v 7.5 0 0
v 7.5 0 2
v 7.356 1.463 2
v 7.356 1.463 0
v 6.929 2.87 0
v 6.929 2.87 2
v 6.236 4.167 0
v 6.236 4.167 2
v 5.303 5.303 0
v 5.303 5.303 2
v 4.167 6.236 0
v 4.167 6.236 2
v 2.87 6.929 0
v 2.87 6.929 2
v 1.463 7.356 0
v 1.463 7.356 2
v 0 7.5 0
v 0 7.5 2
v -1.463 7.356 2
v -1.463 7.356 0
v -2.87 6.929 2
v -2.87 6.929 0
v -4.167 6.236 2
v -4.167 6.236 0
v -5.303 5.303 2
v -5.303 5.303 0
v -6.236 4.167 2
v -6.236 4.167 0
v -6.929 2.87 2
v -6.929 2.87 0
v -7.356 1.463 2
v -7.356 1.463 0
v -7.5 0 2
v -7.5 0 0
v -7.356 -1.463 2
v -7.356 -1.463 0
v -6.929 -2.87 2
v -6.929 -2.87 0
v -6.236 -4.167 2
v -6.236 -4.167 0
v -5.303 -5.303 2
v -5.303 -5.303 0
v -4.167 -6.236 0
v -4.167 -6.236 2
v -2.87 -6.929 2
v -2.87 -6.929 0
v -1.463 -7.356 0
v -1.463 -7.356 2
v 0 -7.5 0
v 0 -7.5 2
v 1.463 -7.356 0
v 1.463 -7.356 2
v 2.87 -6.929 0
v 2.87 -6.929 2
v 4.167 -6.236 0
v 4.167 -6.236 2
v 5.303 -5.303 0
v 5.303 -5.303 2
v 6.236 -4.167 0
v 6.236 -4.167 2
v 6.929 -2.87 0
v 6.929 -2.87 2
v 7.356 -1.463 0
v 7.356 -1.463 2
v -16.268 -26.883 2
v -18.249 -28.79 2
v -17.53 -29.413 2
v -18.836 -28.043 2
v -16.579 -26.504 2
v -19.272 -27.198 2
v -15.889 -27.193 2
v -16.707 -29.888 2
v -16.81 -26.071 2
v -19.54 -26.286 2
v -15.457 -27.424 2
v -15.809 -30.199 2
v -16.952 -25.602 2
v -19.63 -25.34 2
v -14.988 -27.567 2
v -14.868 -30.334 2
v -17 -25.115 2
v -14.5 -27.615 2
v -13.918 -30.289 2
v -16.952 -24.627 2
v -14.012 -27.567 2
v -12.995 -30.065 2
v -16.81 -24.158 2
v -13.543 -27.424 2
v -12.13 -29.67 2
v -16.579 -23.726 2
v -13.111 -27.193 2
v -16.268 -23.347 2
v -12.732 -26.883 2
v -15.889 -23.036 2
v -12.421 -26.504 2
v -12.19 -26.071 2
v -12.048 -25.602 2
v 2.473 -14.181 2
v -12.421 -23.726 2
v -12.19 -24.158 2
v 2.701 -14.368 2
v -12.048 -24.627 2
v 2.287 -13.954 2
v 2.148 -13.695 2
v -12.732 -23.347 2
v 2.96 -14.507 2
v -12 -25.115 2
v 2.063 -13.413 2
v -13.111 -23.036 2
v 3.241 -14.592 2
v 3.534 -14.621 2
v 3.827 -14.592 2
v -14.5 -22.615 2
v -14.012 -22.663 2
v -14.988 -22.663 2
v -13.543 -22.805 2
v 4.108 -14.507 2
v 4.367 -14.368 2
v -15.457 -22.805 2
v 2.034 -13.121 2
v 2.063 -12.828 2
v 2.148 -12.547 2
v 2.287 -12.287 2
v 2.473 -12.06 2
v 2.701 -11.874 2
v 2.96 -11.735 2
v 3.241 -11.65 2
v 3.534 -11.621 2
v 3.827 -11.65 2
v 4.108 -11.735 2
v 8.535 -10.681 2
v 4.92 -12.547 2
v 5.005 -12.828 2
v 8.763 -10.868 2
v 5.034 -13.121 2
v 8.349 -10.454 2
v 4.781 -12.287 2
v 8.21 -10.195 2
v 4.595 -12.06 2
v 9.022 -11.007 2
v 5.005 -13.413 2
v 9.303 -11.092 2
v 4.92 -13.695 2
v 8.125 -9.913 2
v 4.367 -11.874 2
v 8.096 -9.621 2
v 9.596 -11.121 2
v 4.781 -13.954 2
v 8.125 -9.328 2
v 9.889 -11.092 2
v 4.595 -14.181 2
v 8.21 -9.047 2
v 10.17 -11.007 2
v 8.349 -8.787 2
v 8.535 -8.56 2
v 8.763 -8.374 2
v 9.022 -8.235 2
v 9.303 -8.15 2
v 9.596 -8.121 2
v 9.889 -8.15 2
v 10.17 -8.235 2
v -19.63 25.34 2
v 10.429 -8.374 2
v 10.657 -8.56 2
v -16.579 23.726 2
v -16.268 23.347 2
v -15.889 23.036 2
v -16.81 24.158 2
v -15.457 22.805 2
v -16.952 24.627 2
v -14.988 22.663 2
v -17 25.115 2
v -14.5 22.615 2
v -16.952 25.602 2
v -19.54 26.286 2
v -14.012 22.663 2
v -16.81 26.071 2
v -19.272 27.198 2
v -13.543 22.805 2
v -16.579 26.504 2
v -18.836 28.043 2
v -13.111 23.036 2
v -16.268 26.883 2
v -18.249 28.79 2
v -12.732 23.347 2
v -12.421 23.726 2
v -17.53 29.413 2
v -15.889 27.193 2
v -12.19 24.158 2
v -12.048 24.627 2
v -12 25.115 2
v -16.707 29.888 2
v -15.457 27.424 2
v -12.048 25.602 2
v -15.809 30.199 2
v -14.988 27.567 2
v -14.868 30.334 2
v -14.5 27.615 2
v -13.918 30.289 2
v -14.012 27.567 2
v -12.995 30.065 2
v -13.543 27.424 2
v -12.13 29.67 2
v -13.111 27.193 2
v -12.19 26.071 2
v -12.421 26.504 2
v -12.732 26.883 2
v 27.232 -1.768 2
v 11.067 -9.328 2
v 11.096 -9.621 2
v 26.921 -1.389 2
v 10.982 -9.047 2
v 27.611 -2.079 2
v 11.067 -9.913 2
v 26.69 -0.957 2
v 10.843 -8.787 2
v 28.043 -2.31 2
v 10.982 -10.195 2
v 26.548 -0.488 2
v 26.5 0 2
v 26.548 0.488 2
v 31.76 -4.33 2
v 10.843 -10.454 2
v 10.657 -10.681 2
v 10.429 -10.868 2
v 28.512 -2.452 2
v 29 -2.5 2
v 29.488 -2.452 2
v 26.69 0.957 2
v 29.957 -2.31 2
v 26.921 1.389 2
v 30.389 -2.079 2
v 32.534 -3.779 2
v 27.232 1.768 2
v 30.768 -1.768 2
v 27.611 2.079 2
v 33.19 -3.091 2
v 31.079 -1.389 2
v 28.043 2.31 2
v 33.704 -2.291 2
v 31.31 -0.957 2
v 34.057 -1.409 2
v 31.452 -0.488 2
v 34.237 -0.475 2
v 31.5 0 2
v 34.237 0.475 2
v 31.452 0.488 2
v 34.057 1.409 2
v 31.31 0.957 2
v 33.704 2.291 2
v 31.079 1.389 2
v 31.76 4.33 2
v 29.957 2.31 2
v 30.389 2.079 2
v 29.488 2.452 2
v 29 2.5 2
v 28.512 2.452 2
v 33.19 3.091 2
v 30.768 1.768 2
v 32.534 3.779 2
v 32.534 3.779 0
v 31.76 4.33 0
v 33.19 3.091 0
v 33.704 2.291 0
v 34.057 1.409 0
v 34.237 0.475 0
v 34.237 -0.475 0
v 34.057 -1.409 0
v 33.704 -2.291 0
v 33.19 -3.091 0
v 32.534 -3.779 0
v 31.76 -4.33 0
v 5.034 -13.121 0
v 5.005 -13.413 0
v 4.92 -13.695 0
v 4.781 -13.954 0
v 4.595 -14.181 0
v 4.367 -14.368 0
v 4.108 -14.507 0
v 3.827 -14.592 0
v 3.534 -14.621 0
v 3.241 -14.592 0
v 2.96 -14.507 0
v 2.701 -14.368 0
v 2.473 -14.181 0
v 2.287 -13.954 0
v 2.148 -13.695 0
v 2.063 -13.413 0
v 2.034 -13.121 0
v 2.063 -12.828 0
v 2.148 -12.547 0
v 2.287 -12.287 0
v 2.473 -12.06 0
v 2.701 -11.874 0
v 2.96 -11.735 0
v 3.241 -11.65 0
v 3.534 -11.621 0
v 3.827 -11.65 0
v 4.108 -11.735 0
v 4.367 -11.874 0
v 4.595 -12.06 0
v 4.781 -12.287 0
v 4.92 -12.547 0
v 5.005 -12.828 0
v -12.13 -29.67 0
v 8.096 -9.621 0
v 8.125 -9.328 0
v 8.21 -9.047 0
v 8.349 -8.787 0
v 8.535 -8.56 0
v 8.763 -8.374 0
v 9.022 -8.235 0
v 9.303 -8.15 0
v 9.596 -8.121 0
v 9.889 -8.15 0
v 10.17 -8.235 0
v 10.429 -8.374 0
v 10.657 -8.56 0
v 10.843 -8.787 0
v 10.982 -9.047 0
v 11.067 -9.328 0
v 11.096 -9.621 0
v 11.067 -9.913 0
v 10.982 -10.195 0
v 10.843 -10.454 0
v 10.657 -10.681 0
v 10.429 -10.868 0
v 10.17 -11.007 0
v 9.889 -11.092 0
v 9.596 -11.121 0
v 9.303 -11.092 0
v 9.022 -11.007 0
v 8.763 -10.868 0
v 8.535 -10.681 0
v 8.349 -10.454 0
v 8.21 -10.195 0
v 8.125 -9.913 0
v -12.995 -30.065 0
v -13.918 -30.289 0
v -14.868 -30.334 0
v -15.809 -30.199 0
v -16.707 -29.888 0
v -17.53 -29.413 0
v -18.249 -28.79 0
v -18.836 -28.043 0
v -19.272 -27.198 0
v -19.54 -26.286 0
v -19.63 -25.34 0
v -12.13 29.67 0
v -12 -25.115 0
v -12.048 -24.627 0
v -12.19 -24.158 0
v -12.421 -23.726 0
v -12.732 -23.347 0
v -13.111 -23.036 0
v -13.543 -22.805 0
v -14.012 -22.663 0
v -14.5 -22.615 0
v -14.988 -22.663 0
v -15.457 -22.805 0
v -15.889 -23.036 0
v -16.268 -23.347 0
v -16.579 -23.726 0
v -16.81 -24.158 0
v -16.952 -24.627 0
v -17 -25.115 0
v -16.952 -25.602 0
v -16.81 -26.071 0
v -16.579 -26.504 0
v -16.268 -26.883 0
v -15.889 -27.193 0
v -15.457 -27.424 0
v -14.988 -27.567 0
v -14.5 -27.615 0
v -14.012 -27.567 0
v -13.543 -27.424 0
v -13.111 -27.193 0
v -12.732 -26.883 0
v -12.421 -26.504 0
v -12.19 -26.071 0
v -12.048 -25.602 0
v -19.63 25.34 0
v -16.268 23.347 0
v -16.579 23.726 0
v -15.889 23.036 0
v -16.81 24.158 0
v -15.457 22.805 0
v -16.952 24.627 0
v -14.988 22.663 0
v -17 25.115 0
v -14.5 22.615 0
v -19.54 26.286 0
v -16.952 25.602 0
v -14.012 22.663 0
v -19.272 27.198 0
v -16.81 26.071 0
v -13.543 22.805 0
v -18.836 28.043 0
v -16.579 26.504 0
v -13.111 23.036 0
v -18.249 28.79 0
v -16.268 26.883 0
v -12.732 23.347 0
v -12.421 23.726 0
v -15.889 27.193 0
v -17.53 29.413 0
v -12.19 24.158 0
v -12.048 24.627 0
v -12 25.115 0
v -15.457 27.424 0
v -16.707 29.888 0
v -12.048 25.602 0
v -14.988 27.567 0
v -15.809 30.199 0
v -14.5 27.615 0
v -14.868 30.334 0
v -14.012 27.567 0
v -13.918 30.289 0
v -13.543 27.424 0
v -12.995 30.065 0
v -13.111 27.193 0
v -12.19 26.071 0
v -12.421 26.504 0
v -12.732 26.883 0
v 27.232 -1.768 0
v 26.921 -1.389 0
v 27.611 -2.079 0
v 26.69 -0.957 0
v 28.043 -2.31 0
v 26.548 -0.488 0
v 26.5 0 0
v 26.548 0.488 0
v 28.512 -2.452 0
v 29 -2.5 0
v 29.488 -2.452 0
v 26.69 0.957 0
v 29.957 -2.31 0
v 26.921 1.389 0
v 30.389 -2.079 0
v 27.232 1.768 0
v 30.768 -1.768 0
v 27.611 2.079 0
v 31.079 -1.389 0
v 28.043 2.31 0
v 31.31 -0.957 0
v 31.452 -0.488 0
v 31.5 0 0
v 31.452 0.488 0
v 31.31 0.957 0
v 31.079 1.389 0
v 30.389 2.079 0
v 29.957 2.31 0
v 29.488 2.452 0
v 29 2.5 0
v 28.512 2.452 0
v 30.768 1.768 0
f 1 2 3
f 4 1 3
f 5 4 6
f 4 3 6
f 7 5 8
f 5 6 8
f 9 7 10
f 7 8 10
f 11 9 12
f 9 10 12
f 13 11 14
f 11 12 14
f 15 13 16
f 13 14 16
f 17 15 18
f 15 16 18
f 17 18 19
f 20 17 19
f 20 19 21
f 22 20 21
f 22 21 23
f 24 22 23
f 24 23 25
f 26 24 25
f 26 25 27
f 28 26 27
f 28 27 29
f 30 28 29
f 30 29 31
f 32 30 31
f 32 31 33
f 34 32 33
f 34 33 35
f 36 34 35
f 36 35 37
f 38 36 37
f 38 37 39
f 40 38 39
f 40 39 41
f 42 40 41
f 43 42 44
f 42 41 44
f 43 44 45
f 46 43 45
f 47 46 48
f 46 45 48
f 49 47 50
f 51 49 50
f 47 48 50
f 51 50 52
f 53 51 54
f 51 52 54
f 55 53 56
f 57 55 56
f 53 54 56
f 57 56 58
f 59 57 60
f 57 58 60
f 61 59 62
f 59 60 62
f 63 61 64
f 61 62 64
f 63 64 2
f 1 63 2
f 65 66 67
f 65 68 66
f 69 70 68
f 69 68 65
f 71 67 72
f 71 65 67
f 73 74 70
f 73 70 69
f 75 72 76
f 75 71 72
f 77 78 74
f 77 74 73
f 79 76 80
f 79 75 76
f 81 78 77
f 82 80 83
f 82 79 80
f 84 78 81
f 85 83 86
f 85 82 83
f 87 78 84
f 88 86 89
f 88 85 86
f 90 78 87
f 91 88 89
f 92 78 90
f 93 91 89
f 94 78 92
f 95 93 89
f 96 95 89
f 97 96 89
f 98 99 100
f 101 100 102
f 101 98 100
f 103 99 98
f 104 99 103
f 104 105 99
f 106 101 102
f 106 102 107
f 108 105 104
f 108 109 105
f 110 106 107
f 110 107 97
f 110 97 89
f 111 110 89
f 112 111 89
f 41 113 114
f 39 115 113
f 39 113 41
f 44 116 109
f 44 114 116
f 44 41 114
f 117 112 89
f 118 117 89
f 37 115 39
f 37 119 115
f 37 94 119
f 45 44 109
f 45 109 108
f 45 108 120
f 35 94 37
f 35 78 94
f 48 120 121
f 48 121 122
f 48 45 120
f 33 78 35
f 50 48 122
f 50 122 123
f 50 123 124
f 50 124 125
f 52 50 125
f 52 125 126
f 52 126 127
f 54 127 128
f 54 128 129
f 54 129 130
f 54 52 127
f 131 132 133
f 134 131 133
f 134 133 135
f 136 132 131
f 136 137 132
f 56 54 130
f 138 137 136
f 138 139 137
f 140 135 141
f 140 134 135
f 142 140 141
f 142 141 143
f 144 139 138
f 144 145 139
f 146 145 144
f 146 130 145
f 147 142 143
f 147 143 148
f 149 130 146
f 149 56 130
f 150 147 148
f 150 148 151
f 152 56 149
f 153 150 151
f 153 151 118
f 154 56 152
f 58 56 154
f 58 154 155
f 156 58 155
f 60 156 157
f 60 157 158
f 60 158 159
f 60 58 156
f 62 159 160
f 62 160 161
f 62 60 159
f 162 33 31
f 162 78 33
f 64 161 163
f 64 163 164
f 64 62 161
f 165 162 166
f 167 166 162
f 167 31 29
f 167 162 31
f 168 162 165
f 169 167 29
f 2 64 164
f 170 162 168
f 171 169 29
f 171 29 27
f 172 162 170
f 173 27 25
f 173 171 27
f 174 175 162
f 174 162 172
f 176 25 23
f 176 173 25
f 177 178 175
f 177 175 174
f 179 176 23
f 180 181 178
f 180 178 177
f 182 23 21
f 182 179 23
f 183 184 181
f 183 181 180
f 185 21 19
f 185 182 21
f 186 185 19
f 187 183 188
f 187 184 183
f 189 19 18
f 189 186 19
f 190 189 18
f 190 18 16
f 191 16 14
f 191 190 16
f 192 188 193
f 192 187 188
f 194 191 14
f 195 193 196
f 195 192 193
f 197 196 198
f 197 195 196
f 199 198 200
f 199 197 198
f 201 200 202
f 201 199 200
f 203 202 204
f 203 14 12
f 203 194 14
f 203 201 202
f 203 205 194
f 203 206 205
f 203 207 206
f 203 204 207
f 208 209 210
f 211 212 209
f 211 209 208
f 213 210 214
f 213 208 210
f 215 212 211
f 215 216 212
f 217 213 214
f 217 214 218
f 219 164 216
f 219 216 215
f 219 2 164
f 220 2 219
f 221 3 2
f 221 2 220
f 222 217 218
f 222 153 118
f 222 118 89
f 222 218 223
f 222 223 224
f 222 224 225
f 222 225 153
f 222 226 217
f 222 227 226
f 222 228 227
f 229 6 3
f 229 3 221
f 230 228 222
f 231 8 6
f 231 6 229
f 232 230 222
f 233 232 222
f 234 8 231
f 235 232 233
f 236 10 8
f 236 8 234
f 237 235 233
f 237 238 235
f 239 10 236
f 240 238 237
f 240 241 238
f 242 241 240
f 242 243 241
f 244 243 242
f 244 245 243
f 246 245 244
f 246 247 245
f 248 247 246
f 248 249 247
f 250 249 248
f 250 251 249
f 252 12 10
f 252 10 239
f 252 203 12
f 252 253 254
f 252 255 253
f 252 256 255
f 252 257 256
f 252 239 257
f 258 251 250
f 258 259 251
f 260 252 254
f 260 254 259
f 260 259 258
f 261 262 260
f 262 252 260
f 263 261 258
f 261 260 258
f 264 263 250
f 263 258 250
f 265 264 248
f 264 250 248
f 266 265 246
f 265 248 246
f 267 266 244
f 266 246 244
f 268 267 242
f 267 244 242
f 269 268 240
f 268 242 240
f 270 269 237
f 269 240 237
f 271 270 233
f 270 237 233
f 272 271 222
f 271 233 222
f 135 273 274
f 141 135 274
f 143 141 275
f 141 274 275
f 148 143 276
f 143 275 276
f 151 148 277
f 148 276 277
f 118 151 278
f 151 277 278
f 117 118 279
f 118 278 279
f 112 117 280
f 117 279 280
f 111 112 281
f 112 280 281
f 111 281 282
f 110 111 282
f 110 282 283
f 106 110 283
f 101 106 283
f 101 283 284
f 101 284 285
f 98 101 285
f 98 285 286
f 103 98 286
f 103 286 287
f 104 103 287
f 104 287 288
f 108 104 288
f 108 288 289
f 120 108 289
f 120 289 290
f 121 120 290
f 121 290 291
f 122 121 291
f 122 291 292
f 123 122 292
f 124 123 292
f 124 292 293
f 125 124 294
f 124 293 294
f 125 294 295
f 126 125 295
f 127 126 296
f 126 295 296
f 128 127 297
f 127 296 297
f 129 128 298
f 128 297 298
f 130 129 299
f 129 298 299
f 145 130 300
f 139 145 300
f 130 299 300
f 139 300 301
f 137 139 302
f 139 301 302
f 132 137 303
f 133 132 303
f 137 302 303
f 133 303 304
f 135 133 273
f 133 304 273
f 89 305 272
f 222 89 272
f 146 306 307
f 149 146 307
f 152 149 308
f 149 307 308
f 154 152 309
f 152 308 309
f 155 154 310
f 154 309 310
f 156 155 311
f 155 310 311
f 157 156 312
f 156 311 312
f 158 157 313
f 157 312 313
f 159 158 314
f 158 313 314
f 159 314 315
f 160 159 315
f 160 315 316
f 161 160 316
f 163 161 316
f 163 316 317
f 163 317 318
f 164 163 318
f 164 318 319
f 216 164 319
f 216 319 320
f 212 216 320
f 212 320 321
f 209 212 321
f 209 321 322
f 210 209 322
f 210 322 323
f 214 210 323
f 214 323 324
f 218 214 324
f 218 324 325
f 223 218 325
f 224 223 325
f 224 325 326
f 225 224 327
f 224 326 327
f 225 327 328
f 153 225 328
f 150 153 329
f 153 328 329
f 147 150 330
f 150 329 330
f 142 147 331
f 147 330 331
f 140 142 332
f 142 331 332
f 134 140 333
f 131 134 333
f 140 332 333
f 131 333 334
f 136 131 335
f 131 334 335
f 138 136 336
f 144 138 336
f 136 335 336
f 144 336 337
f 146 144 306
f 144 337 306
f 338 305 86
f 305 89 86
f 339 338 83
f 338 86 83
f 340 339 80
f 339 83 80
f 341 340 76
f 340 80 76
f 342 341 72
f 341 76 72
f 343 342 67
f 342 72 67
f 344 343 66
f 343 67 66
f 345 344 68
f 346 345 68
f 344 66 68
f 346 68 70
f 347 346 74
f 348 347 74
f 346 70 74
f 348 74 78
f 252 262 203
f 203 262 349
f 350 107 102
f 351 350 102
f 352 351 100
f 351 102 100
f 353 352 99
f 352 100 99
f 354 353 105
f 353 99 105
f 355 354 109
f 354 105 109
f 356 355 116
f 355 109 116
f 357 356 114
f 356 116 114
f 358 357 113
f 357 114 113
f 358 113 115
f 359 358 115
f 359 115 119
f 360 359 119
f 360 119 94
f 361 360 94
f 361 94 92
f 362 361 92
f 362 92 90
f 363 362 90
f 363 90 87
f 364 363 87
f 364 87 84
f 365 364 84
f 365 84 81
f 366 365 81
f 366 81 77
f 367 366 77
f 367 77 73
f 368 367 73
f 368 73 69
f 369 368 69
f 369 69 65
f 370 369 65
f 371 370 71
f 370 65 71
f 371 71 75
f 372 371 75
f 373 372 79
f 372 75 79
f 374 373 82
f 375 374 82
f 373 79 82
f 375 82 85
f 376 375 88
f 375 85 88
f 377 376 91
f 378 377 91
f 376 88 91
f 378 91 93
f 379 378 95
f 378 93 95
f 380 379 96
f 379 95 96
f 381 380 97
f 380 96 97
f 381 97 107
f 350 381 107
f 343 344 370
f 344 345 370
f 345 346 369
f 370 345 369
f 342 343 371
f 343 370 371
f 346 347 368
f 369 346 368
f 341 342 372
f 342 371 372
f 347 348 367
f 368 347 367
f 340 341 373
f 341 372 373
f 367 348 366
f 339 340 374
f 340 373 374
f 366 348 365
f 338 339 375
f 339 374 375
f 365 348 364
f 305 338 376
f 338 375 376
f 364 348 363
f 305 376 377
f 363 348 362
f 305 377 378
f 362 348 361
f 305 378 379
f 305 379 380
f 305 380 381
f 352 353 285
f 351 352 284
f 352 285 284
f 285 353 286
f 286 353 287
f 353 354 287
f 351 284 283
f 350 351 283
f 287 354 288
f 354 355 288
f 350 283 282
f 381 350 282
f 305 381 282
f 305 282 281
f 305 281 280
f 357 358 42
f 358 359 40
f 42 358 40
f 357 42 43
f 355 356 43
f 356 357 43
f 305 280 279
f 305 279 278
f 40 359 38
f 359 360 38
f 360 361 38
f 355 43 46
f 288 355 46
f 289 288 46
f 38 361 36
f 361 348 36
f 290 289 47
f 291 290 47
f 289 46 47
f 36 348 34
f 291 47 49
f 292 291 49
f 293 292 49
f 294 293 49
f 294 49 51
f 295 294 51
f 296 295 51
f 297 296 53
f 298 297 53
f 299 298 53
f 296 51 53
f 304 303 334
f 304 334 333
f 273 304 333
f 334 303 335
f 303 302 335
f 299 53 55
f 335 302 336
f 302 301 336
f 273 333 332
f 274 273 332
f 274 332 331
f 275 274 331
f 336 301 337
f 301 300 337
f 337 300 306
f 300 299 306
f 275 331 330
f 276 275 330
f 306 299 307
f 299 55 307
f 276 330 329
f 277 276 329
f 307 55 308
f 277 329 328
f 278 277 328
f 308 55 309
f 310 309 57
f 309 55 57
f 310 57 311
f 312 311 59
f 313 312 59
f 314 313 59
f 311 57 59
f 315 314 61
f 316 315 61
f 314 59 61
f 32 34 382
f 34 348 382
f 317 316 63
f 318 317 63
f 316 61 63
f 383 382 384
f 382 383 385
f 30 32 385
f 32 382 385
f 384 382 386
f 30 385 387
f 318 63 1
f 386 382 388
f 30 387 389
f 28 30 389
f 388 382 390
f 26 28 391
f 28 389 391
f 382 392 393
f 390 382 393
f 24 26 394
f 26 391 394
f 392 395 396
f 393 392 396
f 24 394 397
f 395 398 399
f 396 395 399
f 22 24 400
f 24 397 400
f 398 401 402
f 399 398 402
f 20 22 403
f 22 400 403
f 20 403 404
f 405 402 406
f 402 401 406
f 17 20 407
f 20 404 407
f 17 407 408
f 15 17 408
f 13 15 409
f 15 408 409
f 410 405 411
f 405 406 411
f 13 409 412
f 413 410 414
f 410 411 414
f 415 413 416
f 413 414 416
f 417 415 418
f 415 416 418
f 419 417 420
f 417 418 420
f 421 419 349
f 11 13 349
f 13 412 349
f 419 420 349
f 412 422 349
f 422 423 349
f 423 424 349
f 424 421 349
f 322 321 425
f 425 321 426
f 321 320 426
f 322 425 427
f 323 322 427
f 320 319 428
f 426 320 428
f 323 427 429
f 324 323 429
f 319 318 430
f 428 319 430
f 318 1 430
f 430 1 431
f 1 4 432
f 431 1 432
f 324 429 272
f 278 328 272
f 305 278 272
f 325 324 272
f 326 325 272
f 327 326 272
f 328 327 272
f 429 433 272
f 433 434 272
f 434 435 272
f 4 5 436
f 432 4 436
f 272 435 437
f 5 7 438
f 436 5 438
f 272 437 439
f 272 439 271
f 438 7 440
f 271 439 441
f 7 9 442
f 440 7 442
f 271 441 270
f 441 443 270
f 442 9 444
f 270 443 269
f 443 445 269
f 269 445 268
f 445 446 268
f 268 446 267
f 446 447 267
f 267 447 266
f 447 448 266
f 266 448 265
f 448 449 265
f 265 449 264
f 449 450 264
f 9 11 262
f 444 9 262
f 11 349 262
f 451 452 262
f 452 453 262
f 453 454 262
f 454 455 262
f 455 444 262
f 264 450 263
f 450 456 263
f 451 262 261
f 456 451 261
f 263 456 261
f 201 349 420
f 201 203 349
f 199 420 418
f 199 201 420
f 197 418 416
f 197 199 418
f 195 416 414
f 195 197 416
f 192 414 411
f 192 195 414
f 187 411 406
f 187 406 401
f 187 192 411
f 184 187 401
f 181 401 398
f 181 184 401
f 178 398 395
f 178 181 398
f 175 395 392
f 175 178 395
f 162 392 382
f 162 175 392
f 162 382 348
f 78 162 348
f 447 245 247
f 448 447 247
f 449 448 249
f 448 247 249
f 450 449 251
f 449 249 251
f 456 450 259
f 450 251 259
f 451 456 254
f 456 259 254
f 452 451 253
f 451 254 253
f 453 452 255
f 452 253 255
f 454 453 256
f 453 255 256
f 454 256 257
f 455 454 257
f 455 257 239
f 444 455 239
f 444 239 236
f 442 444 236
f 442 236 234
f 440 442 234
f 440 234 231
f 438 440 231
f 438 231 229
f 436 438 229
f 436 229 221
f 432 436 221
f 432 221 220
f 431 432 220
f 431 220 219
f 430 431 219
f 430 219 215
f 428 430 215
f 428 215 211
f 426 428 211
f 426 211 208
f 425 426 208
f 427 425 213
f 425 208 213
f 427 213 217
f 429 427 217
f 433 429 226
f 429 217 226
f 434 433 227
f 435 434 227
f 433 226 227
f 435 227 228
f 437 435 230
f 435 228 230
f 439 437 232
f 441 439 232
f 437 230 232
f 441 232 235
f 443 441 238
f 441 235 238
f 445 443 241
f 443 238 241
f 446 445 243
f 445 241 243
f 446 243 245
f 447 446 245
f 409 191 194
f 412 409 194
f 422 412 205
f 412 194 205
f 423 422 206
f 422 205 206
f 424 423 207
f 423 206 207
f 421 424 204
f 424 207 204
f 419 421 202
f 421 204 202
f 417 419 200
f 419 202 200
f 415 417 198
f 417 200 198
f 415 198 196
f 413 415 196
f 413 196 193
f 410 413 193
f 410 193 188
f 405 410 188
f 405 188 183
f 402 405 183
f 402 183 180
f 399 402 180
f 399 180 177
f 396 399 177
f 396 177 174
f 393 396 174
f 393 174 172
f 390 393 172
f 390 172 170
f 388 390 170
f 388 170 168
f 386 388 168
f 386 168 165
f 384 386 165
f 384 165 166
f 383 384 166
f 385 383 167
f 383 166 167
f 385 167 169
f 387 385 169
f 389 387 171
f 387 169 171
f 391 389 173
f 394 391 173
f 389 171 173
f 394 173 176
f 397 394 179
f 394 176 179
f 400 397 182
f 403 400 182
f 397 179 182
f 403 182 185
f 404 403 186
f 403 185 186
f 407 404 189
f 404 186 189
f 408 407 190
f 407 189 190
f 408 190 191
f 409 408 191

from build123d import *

# Parameters (mm, degrees)
EXTRUDE_1_DEPTH     = 2
SKETCH_2_R          = 7.5
CUT_EXTRUDE_1_DEPTH = 52.974352649
SKETCH_3_R          = 2.5
CUT_EXTRUDE_2_DEPTH = 52.974352649
FILLET_2_R          = 5
SKETCH_4_R          = 1.5
CUT_EXTRUDE_3_DEPTH = 3


with BuildPart() as part:
    # 草图1 → 凸台-拉伸1 (new body)
    with BuildSketch(Plane.XY):
        Polygon((39.259818305, 0), (-19.629909152, 34), (-19.629909152, -34), align=None)
    extrude(amount=EXTRUDE_1_DEPTH)

    # 草图2 → 切除-拉伸1 (cut, through all)
    with BuildSketch(Plane.XY.offset(2)):
        Circle(SKETCH_2_R)
    extrude(amount=-CUT_EXTRUDE_1_DEPTH, mode=Mode.SUBTRACT)

    # 草图3 → 切除-拉伸2 (cut, through all)
    with BuildSketch(Plane.XY.offset(2)):
        with Locations((29, 0)):
            Circle(SKETCH_3_R)
        with Locations((-14.5, -25.11473671)):
            Circle(SKETCH_3_R)
        with Locations((-14.5, 25.11473671)):
            Circle(SKETCH_3_R)
    extrude(amount=-CUT_EXTRUDE_2_DEPTH, mode=Mode.SUBTRACT)

    # 圆角2
    fillet_2_edges = [part.edges().sort_by_distance(p)[0] for p in [
        (-19.629909152, -34, 1),
        (-19.629909152, 34, 1),
        (39.259818305, 0, 1),
    ]]
    fillet(fillet_2_edges, radius=FILLET_2_R)

    # 草图4 → 切除-拉伸3 (cut)
    with BuildSketch(Plane(origin=(0, 0, 0), x_dir=(-1, 0, 0), z_dir=(0, 0, -1))):
        with Locations(Location((-3.533865663, -13.120834875, 0), (0, 0, 180))):
            Circle(SKETCH_4_R)
        with Locations((-9.596043489, -9.620834875)):
            Circle(SKETCH_4_R)
    extrude(amount=-CUT_EXTRUDE_3_DEPTH, mode=Mode.SUBTRACT)


solid = part.part
